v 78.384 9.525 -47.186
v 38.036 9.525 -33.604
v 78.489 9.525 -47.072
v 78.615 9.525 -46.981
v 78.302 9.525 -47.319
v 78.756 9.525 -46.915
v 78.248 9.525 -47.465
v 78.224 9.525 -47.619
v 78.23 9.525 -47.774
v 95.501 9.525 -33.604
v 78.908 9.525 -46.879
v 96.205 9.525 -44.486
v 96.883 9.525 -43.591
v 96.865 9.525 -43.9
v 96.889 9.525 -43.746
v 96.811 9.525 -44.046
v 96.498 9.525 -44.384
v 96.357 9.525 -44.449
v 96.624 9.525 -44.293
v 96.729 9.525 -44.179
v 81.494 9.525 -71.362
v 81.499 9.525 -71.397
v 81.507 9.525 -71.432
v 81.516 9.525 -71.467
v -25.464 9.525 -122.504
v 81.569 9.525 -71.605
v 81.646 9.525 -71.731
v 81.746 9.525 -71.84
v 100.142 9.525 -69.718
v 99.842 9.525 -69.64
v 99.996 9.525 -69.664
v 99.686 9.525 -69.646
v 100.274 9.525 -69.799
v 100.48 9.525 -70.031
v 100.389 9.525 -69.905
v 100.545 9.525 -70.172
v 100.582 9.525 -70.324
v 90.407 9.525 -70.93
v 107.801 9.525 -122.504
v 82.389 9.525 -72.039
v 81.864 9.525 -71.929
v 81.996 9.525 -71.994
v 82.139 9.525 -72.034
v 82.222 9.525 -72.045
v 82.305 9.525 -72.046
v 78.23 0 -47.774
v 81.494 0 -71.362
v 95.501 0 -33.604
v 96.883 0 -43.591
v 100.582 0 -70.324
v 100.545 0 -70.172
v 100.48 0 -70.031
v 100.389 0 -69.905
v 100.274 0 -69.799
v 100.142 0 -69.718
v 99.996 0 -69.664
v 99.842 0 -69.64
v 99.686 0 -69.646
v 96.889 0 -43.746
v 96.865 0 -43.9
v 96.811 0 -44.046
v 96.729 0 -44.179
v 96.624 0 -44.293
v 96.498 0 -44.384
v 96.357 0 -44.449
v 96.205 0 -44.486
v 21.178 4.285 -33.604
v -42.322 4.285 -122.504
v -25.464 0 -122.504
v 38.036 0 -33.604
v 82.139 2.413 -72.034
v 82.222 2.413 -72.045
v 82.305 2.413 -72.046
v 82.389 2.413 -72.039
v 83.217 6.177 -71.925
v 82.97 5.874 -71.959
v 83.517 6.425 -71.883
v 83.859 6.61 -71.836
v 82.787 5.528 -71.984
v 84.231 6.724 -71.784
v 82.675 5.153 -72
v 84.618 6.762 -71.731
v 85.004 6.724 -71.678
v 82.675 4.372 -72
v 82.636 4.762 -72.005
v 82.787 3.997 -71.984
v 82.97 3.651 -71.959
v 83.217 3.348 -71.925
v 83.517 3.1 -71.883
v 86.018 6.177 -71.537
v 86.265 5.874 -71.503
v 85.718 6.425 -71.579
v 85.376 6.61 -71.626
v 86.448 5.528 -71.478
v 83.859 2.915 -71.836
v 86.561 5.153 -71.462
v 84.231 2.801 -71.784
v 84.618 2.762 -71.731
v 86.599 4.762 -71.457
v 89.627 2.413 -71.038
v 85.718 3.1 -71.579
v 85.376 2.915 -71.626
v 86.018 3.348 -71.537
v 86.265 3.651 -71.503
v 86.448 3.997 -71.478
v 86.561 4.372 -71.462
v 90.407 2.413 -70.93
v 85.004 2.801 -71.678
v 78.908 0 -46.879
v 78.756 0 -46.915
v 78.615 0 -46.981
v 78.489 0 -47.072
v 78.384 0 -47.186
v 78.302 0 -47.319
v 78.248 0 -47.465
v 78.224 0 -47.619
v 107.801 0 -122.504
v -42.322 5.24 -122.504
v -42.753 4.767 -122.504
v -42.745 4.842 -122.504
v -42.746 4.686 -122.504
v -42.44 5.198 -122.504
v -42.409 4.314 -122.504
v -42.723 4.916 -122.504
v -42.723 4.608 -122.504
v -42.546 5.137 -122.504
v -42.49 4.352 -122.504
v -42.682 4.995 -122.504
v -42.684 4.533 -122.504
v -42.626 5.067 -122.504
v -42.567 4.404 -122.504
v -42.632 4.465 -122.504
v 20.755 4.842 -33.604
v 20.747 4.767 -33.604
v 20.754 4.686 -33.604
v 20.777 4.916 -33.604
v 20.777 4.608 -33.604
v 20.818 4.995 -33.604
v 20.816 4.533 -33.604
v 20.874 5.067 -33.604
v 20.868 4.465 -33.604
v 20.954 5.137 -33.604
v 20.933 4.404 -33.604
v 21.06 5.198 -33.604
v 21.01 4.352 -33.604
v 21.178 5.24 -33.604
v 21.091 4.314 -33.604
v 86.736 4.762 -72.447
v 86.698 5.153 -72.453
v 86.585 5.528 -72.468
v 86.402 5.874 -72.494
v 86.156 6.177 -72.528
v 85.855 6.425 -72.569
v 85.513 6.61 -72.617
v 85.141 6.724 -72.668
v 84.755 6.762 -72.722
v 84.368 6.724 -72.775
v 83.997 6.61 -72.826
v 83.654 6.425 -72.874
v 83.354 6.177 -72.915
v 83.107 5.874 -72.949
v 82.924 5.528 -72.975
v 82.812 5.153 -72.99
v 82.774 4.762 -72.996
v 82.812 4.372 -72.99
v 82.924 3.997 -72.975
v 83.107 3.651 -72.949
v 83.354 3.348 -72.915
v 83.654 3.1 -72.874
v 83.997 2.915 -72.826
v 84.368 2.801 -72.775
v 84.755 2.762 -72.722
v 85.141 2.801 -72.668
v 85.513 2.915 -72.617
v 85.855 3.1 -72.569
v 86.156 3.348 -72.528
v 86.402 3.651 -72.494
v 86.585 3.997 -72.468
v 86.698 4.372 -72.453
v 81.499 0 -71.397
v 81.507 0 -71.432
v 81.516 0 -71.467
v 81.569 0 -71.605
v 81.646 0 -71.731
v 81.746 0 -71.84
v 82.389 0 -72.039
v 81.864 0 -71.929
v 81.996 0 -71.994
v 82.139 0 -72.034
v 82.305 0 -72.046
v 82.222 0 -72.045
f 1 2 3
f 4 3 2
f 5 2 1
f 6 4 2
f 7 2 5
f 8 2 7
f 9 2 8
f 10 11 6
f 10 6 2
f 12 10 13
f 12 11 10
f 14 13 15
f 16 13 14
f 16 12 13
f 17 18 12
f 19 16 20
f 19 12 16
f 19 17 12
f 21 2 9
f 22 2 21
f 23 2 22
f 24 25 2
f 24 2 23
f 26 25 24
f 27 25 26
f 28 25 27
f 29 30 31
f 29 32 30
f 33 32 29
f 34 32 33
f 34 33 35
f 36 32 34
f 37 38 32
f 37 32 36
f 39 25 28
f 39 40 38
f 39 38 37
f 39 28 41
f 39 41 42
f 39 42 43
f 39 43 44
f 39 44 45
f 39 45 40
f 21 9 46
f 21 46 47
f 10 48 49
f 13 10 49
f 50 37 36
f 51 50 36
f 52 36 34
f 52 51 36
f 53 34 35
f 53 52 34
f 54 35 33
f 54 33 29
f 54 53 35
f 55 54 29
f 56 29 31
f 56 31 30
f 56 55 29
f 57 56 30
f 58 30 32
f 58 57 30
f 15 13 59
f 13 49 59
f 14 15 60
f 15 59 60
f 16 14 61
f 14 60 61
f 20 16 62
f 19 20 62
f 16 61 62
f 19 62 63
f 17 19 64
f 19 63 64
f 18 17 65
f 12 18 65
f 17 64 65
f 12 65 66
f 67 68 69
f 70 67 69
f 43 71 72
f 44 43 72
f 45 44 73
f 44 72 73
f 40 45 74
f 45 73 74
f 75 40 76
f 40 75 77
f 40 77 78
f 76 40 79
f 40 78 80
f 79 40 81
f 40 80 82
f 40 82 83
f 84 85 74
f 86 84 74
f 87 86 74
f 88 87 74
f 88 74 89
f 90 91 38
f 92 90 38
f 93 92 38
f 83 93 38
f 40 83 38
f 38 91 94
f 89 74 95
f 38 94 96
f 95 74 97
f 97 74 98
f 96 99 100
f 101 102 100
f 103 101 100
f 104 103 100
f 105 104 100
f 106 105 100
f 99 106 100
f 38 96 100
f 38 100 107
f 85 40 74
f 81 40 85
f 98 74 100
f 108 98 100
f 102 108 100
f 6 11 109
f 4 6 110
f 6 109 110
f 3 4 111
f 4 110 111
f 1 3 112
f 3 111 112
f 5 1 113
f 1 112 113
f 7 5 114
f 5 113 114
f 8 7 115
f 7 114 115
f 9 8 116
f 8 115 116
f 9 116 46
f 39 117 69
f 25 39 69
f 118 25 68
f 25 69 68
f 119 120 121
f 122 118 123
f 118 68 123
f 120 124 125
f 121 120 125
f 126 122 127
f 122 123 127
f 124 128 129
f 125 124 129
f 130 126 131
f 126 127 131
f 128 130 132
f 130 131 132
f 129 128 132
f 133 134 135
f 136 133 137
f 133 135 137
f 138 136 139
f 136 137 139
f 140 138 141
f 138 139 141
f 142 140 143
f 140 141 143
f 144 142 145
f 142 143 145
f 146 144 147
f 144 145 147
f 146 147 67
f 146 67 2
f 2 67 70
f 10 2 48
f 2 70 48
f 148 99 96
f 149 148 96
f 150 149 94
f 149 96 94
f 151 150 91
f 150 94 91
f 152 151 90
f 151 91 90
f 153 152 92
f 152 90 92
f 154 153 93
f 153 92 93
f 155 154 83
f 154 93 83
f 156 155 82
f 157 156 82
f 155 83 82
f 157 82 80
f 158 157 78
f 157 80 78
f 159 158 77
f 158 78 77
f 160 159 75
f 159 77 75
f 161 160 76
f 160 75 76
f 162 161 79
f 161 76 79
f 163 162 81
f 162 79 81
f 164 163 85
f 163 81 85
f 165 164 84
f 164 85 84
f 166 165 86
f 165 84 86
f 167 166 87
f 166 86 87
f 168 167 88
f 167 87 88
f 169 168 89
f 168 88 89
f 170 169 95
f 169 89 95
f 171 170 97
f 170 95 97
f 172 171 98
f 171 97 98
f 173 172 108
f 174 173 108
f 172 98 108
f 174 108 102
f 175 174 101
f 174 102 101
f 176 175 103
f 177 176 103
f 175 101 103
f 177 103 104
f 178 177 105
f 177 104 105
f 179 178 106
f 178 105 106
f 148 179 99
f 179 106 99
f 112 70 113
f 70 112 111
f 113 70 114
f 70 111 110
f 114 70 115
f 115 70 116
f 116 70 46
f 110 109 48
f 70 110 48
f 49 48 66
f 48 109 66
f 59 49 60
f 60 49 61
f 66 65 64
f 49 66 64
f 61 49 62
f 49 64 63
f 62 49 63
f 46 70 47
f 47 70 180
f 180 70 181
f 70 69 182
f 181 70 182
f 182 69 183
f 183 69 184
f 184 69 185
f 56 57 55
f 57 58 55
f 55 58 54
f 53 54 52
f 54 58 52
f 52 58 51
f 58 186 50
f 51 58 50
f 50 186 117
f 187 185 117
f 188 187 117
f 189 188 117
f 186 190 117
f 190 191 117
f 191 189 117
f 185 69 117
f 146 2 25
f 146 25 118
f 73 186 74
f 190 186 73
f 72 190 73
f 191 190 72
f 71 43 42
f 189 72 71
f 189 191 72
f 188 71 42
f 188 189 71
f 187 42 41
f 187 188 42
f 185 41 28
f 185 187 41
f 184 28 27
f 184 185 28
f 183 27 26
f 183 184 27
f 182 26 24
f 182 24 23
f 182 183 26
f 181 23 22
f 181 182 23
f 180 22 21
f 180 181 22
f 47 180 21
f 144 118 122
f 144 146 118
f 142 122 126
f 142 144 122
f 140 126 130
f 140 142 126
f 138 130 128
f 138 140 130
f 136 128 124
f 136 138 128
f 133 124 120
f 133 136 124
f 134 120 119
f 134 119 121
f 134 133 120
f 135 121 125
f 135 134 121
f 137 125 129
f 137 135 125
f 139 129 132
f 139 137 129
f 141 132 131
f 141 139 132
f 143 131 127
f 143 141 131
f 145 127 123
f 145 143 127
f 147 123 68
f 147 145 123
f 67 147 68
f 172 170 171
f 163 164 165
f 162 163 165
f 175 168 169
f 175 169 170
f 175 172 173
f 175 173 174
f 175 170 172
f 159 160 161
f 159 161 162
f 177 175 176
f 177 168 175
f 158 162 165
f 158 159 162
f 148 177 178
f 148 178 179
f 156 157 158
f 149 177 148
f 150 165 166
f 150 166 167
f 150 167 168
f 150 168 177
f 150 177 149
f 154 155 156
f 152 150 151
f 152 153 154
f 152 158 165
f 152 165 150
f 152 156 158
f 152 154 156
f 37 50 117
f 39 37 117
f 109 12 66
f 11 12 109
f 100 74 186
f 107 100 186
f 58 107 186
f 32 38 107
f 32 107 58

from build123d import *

# Parameters (mm, degrees)
BOSS_EXTRUDE1_DEPTH = 9.525
CUT_EXTRUDE11_DEPTH = 109.249530891
CUT_EXTRUDE12_DEPTH = 109.249530891
CUT_EXTRUDE1_DEPTH  = 164.459241155
FILLET25_R          = 0.79375
CUT_EXTRUDE8_DEPTH  = 7.112
FILLET31_R          = 0.79375
FILLET32_R          = 0.5
DELETEFACE2_START   = 2.413
DELETEFACE2_DEPTH   = 8.587
DELETEFACE2_2_DEPTH = 9.525
DELETEFACE3_START   = 2.413
DELETEFACE3_DEPTH   = 7.112
SKETCH42_R          = 2
CUT_EXTRUDE13_DEPTH = 1


with BuildPart() as part:
    # Sketch2 → Boss-Extrude1 (new body)
    with BuildSketch(Plane(origin=(0, 0, 0), x_dir=(1, 0, 0), z_dir=(0, 1, 0))):
        Polygon((95.501036211, 33.603610094), (107.801036211, 122.503610094), (-44.198963789, 122.503610094), (19.301036211, 33.603610094), align=None)
    extrude(amount=BOSS_EXTRUDE1_DEPTH)

    # Sketch40 → Cut-Extrude11 (cut, along a direction that is not the sketch's normal)
    with BuildSketch(Plane(origin=(0, 0, -122.503610094), x_dir=(-1, 0, 0), z_dir=(0, 0, -1))):
        Polygon((44.198963789, 4.7625), (25.464097027, 0), (44.198963789, 0), align=None)
    extrude(amount=-CUT_EXTRUDE11_DEPTH, dir=(-0.5812381937190961, 0, -0.8137334712067352), mode=Mode.SUBTRACT)

    # Sketch41 → Cut-Extrude12 (cut, along a direction that is not the sketch's normal)
    with BuildSketch(Plane(origin=(0, 0, -122.503610094), x_dir=(-1, 0, 0), z_dir=(0, 0, -1))):
        Polygon((44.198963789, 4.7625), (44.198963789, 9.525), (25.464097027, 9.525), align=None)
    extrude(amount=-CUT_EXTRUDE12_DEPTH, dir=(-0.5812381937190961, 0, -0.8137334712067352), mode=Mode.SUBTRACT)

    # Sketch3 → Cut-Extrude1 (cut, through all)
    with BuildSketch(Plane(origin=(0, 9.525, 0), x_dir=(1, 0, 0), z_dir=(0, 1, 0))):
        Polygon((96.991616373, 44.376990288), (78.121375316, 46.987833539), (81.602499651, 72.148154947), (100.472740707, 69.537311696), align=None)
    extrude(amount=-CUT_EXTRUDE1_DEPTH, mode=Mode.SUBTRACT)

    # Fillet25
    fillet25_edges = [part.edges().sort_by_distance(p)[0] for p in [
        (100.472740707, 4.7625, -69.537311696),
        (96.991616373, 4.7625, -44.376990288),
        (78.121375316, 4.7625, -46.987833539),
        (81.602499651, 4.7625, -72.148154947),
    ]]
    fillet(fillet25_edges, radius=FILLET25_R)

    # Sketch4 → Cut-Extrude8 (cut)
    with BuildSketch(Plane(origin=(0, 9.525, 0), x_dir=(1, 0, 0), z_dir=(0, 1, 0))):
        with BuildLine():
            Line((91.432981633, 84.938583056), (91.87398018, 88.3325177))
            ThreePointArc((91.87398018, 88.3325177), (91.880119161, 88.935768076), (91.743819438, 89.523450889))
            Line((91.743819438, 89.523450889), (84.365995583, 109.929022071))
            ThreePointArc((84.365995583, 109.929022071), (84.052194516, 110.530485922), (83.590381446, 111.027435178))
            Line((83.590381446, 111.027435178), (69.63117281, 122.503610094))
            Line((69.63117281, 122.503610094), (65.631546235, 122.503610094))
            Line((65.631546235, 122.503610094), (81.977330858, 109.065378145))
            Line((81.977330858, 109.065378145), (88.524922018, 90.956062972))
            ThreePointArc((88.524922018, 90.956062972), (86.871368444, 87.055321455), (82.635738177, 86.958058718))
            ThreePointArc((82.635738177, 86.958058718), (82.108570303, 87.435753172), (81.573856943, 87.904986143))
            ThreePointArc((81.573856943, 87.904986143), (80.279037974, 88.75135311), (78.792534366, 89.179372068))
            Line((78.792534366, 89.179372068), (71.259162002, 90.172380139))
            Line((71.259162002, 90.172380139), (70.399965305, 83.95114873))
            Line((70.399965305, 83.95114873), (68.995626594, 73.78267842))
            Line((68.995626594, 73.78267842), (81.599351809, 72.105893611))
            Line((81.599351809, 72.105893611), (81.450209567, 70.968016338))
            Line((81.450209567, 70.968016338), (82.559812791, 70.82309653))
            Line((82.559812791, 70.82309653), (82.351161676, 69.22552369))
            Line((82.351161676, 69.22552369), (86.280730255, 68.712302106))
            Line((86.280730255, 68.712302106), (86.63642856, 71.435766832))
            Line((86.63642856, 71.435766832), (89.626769646, 71.037935364))
            Line((89.626769646, 71.037935364), (91.432981633, 84.938583056))
        make_face()
    extrude(amount=-CUT_EXTRUDE8_DEPTH, mode=Mode.SUBTRACT)

    # Fillet31
    # the kernel refuses this fillet: 0.79375 mm, written as the material it adds along each edge
    with BuildSketch(Plane(origin=(71.259162002, 9.525, -90.172380139), x_dir=(0.9914240578116118, 0, 0.13068411377194142), z_dir=(0, -1, 0))) as fillet31_piece_1:
        with BuildLine():
            CenterArc((FILLET31_R * 0.993838975456, FILLET31_R), FILLET31_R, 180.35409036, 89.64590964)
            Line((-FILLET31_R * 0.00614192814136, FILLET31_R * 0.993819996707), (0, 0))
            Line((0, 0), (FILLET31_R * 0.993838975456, 0))
        make_face()
    extrude(amount=9.084149217)
    with BuildSketch(Plane(origin=(68.995626594, 9.525, -73.78267842), x_dir=(0.13680862211806724, 0, -0.9905974969250406), z_dir=(0, -1, 0))) as fillet31_piece_2:
        with BuildLine():
            CenterArc((FILLET31_R * 1.00498928997, FILLET31_R), FILLET31_R, 179.714846688, 90.285153312)
            Line((FILLET31_R * 0.00500167453449, FILLET31_R * 1.00497684362), (0, 0))
            Line((0, 0), (FILLET31_R * 1.00498928997, 0))
        make_face()
    extrude(amount=9.106275622)
    # the kernel refuses this fillet: 0.79375 mm, written as the material it takes off along each edge
    with BuildSketch(Plane(origin=(89.626769646, 11.493028645, -71.037935364), x_dir=(0.9905638349724125, 0, 0.13705213914692133), z_dir=(0, -1, 0))) as fillet31_2_piece_1:
        with BuildLine():
            CenterArc((FILLET31_R * 0.991762466743, -FILLET31_R), FILLET31_R, 90, 89.526074815)
            Line((-FILLET31_R * 0.00820332414174, -FILLET31_R * 0.991728539427), (0, 0))
            Line((0, 0), (FILLET31_R * 0.991762466743, 0))
        make_face()
    extrude(amount=9.080028645, mode=Mode.SUBTRACT)
    with BuildSketch(Plane(origin=(81.599351809, 11.470712134, -72.105893611), x_dir=(-0.99126610392599, 0, -0.1318768789719729), z_dir=(0, -1, 0))) as fillet31_2_piece_2:
        with BuildLine():
            CenterArc((0.778284853, -0.79375), FILLET31_R, 90, 79.138737607)
            Line((-0.001246175, -0.644182498), (0, 0))
            Line((0, 0), (0.778284853, 0))
        make_face()
    extrude(amount=9.057712134, mode=Mode.SUBTRACT)

    # Fillet32
    fillet32_edges = [part.edges().sort_by_distance(p)[0] for p in [
        (-12.448963789, 4.7625, -78.053610094),
    ]]
    fillet(fillet32_edges, radius=FILLET32_R)

    # DeleteFace2: read off the stored shape, not the designer's step
    # DeleteFace2 outline → DeleteFace2 (cut)
    with BuildSketch(Plane(origin=(0, 0, 0), x_dir=(1, 0, 0), z_dir=(0, 1, 0)).offset(DELETEFACE2_START)):
        with BuildLine():
            Line((71.259162002, 90.172380139), (71.151239195, 89.390937708))
            ThreePointArc((71.151239195, 89.390937708), (71.456370289, 89.91363683), (72.041256474, 90.06928871))
            Line((72.041256474, 90.06928871), (71.259162002, 90.172380139))
        make_face()
        with BuildLine():
            Line((68.995626594, 73.78267842), (69.786369725, 73.677478882))
            ThreePointArc((69.786369725, 73.677478882), (69.259466687, 73.983520547), (69.104760234, 74.572888196))
            Line((69.104760234, 74.572888196), (68.995626594, 73.78267842))
        make_face()
    extrude(amount=DELETEFACE2_DEPTH, mode=Mode.SUBTRACT)

    # DeleteFace2 2 outline → DeleteFace2 2 (add)
    with BuildSketch(Plane(origin=(0, 0, 0), x_dir=(1, 0, 0), z_dir=(0, 1, 0))):
        with BuildLine():
            ThreePointArc((80.827864414, 72.208531388), (81.305090173, 71.961554565), (81.515634323, 71.467172994))
            ThreePointArc((81.515634323, 71.467172994), (81.745680073, 71.840109312), (82.138550491, 72.034159252))
            Line((82.138550491, 72.034159252), (80.827864414, 72.208531388))
        make_face()
    extrude(amount=DELETEFACE2_2_DEPTH)

    # DeleteFace3: read off the stored shape, not the designer's step
    # DeleteFace3 outline → DeleteFace3 (add)
    with BuildSketch(Plane(origin=(0, 0, 0), x_dir=(1, 0, 0), z_dir=(0, 1, 0)).offset(DELETEFACE3_START)):
        with BuildLine():
            Line((82.388759695, 72.039369812), (90.406552846, 70.93004635))
            ThreePointArc((90.406552846, 70.93004635), (89.884432105, 71.234645894), (89.728205023, 71.818584289))
            Line((89.728205023, 71.818584289), (91.87398018, 88.3325177))
            ThreePointArc((91.87398018, 88.3325177), (91.880119161, 88.935768076), (91.743819438, 89.523450889))
            Line((91.743819438, 89.523450889), (84.365995583, 109.929022071))
            ThreePointArc((84.365995583, 109.929022071), (84.052194516, 110.530485922), (83.590381446, 111.027435178))
            Line((83.590381446, 111.027435178), (69.63117281, 122.503610094))
            Line((69.63117281, 122.503610094), (65.631546235, 122.503610094))
            Line((65.631546235, 122.503610094), (81.977330858, 109.065378145))
            Line((81.977330858, 109.065378145), (88.524922018, 90.956062972))
            ThreePointArc((88.524922018, 90.956062972), (86.871368444, 87.055321455), (82.635738177, 86.958058718))
            ThreePointArc((82.635738177, 86.958058718), (82.108570303, 87.435753172), (81.573856943, 87.904986143))
            ThreePointArc((81.573856943, 87.904986143), (80.279037974, 88.75135311), (78.792534366, 89.179372068))
            Line((78.792534366, 89.179372068), (71.259162002, 90.172380139))
            Line((71.259162002, 90.172380139), (68.995626594, 73.78267842))
            Line((68.995626594, 73.78267842), (82.138550491, 72.034159252))
            ThreePointArc((82.138550491, 72.034159252), (82.263448445, 72.04668771), (82.388759695, 72.039369812))
        make_face()
    extrude(amount=DELETEFACE3_DEPTH)

    # Sketch42 → Cut-Extrude13 (cut)
    with BuildSketch(Plane(origin=(11.327516936, 0, -81.871240295), x_dir=(0.9905638349724135, 0, 0.13705213914691416), z_dir=(-0.13705213914691416, 0, 0.9905638349724135))):
        with Locations((73.988256108, 4.7625)):
            Circle(SKETCH42_R)
    extrude(amount=-CUT_EXTRUDE13_DEPTH, mode=Mode.SUBTRACT)


solid = part.part
